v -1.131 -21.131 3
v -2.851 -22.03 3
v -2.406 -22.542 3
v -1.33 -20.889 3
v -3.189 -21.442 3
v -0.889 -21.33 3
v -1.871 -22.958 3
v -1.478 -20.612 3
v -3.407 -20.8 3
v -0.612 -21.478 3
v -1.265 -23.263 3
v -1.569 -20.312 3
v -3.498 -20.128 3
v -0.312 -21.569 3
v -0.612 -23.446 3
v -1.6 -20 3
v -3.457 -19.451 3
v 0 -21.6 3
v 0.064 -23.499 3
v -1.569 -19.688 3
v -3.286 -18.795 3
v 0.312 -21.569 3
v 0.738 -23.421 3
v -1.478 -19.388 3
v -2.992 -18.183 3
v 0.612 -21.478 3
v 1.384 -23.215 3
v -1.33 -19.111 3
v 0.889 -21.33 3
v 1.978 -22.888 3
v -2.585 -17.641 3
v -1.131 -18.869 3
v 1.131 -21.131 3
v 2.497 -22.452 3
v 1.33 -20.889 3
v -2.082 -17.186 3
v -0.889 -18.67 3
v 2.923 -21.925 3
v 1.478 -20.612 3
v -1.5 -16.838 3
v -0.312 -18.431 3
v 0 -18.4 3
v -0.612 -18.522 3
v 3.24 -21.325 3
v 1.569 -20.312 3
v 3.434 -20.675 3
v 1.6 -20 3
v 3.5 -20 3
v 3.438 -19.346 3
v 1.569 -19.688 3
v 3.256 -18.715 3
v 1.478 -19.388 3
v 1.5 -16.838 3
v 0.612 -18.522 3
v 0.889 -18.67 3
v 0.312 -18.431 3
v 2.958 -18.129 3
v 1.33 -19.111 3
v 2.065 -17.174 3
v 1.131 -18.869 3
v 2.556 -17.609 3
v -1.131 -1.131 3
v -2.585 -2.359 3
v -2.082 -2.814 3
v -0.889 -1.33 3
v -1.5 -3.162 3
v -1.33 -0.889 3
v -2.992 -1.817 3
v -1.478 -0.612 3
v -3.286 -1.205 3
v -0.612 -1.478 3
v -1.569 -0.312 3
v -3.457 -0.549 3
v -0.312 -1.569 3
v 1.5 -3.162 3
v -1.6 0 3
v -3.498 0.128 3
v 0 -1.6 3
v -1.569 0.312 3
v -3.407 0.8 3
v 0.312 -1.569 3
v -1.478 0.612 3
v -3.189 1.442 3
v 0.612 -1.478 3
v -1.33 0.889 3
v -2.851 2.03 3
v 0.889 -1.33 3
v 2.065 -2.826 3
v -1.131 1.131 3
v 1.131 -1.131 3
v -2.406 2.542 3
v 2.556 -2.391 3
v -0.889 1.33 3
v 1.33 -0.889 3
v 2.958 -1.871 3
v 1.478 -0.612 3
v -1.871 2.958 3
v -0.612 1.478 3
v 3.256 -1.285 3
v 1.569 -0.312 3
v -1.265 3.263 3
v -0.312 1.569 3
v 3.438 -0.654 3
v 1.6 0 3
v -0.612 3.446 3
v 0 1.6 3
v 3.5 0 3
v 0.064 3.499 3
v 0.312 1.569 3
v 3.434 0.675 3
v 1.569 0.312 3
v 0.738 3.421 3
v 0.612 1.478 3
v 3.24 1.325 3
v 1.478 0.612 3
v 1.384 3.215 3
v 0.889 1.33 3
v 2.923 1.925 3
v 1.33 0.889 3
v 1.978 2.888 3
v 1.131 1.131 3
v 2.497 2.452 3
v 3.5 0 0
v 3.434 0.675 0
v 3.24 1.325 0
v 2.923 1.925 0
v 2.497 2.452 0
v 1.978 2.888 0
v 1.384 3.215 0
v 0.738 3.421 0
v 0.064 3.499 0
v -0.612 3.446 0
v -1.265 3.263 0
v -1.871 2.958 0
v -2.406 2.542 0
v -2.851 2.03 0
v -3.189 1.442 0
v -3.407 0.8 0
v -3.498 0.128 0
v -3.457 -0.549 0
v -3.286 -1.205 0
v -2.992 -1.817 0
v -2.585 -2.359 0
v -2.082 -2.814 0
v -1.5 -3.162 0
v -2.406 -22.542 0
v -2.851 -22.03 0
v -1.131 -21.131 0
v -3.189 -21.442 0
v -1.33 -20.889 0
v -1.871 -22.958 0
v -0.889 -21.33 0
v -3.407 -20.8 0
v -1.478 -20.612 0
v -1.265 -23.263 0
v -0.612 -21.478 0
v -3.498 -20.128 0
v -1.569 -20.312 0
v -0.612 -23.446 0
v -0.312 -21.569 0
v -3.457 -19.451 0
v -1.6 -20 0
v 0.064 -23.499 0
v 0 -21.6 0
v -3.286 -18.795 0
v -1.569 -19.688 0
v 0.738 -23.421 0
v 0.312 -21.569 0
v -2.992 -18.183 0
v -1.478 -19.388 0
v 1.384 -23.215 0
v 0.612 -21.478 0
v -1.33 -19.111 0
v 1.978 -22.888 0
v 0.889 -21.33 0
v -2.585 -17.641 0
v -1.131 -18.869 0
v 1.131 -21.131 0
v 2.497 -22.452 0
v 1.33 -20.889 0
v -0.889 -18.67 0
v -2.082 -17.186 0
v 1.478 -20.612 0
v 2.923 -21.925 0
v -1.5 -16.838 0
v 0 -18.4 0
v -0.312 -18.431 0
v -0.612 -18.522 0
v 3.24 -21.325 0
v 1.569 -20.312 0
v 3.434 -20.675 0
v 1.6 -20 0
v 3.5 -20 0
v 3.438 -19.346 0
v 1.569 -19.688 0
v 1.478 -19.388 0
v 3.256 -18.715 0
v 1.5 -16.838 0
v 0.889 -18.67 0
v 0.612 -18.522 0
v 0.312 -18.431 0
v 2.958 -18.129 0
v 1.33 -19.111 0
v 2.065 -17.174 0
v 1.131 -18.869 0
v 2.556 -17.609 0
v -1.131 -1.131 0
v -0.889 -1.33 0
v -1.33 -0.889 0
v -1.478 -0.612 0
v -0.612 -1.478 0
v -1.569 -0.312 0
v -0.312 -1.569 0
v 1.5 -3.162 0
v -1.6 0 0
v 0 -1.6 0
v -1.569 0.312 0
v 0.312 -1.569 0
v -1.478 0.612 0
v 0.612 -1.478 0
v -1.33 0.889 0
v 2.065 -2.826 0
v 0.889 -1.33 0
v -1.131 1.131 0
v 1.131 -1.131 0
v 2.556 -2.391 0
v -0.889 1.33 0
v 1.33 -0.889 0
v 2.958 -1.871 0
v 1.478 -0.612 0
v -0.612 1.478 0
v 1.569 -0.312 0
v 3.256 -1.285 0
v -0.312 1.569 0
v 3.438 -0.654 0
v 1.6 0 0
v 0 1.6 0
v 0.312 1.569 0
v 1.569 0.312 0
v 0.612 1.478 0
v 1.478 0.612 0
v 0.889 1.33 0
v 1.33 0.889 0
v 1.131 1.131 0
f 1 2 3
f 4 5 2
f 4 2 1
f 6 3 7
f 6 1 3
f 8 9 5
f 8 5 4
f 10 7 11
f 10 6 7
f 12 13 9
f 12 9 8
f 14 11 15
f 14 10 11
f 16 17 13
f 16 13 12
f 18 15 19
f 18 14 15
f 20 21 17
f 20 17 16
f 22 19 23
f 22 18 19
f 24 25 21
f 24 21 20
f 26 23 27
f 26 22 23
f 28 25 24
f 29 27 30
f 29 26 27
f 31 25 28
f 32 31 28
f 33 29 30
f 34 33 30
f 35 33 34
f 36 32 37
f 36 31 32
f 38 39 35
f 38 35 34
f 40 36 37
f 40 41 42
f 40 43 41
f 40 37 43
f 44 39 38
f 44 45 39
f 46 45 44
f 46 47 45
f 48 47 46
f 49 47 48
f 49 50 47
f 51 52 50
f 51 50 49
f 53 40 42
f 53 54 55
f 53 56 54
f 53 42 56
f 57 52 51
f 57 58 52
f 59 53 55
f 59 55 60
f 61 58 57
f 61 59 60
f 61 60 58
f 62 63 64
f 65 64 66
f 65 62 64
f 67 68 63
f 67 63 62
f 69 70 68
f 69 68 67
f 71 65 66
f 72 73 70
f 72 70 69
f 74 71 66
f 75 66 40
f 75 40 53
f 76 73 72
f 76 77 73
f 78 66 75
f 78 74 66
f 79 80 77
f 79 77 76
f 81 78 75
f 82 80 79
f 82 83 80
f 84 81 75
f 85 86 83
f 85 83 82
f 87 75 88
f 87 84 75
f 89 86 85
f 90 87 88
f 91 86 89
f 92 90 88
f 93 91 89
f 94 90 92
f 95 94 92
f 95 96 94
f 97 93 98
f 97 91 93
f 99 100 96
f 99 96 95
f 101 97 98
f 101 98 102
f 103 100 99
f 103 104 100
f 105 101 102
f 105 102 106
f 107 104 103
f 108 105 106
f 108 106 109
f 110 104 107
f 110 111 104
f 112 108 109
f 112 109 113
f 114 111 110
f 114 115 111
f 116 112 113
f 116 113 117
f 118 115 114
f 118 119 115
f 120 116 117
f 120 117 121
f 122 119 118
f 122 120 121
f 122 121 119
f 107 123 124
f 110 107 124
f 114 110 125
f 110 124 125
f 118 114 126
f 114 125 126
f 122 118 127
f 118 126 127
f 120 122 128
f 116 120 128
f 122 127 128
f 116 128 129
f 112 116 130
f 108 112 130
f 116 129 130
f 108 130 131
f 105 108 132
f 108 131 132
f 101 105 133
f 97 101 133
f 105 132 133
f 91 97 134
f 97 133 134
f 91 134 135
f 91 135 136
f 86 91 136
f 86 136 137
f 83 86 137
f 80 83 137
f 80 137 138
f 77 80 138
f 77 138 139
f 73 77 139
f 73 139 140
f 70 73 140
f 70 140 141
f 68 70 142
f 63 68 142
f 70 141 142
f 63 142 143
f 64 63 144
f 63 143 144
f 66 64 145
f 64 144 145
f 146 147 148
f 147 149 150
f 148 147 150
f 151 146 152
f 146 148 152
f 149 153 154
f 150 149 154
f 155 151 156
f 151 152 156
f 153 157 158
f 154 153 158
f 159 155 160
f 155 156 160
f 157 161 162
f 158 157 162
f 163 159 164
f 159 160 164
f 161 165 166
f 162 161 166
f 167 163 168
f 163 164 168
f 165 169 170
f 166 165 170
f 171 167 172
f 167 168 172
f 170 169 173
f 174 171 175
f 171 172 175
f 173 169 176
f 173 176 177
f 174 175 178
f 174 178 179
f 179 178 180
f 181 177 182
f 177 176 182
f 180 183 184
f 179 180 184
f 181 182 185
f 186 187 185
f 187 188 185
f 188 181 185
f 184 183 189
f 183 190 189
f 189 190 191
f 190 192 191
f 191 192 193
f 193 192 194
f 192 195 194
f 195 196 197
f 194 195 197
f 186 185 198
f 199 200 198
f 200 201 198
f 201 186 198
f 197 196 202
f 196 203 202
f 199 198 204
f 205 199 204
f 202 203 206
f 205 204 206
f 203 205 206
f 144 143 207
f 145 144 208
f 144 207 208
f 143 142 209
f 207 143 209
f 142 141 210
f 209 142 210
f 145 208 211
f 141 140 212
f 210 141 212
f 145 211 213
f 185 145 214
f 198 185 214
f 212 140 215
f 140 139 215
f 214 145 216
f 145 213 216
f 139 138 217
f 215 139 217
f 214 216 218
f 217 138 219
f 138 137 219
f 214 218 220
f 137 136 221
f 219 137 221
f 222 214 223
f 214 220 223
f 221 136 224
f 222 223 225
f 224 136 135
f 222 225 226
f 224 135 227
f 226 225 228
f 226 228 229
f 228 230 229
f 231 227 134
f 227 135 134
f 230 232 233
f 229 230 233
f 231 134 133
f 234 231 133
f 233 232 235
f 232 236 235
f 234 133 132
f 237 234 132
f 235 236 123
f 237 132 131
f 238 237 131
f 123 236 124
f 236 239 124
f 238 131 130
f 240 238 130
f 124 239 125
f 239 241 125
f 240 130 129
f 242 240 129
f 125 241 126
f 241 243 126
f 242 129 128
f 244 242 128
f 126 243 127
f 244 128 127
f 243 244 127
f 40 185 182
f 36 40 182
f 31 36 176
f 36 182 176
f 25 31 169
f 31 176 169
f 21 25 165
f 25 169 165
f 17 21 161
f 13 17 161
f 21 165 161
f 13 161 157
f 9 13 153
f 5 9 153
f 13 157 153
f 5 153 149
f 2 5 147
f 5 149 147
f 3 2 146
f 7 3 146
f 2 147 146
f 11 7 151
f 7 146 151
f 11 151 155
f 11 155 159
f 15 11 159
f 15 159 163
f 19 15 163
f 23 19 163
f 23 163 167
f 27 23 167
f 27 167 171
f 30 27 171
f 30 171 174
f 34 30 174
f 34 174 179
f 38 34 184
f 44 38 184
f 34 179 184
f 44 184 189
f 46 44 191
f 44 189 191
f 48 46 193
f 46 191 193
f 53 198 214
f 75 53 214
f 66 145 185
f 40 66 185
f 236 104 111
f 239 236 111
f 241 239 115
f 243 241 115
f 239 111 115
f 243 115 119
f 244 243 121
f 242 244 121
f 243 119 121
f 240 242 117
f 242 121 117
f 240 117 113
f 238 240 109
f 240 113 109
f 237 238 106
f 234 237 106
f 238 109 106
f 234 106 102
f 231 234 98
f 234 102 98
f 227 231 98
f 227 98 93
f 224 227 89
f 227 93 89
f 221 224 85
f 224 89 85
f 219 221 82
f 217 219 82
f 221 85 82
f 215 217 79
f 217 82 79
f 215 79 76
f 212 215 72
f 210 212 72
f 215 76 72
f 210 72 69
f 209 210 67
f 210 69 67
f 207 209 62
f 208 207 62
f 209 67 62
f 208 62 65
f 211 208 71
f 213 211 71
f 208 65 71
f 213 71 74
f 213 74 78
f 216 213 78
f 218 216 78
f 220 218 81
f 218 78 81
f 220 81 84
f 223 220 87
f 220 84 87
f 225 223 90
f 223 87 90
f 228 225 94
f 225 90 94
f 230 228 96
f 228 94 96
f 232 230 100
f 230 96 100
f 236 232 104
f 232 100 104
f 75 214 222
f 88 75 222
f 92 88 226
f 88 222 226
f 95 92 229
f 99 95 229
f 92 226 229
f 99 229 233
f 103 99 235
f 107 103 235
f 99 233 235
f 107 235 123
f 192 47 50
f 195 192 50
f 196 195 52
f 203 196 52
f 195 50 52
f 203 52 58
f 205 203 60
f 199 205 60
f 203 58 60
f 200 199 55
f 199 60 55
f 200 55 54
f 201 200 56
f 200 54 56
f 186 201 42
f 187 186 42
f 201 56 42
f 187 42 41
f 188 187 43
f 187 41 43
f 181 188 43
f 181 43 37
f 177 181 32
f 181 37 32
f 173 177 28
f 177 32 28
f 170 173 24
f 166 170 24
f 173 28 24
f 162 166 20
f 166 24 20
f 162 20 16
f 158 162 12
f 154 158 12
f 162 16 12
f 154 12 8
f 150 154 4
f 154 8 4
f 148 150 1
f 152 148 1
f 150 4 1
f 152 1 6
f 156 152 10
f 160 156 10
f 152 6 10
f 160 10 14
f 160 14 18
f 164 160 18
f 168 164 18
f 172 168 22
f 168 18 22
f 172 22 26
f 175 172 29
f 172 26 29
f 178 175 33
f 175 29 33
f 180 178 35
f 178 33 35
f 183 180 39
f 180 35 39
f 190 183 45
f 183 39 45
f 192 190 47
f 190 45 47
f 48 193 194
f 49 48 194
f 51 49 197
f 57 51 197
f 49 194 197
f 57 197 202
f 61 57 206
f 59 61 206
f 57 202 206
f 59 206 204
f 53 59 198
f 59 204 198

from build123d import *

# Parameters (mm, degrees)
BOSS_EXTRUDE1_DEPTH = 3
SKETCH2_R           = 1.6
CUT_EXTRUDE1_DEPTH  = 3


with BuildPart() as part:
    # Sketch1 → Boss-Extrude1 (new body)
    with BuildSketch(Plane.XY):
        with BuildLine():
            Line((-1.5, -3.16227766), (-1.5, 0))
            Line((-1.5, 0), (1.5, 0))
            Line((1.5, 0), (1.5, -3.16227766))
            ThreePointArc((1.5, -3.16227766), (2.958039892, -1.870828693), (3.5, 0))
            ThreePointArc((3.5, 0), (-1.870828693, 2.958039892), (-1.5, -3.16227766))
        make_face()
        with BuildLine():
            Line((1.5, 0), (-1.5, 0))
            Line((-1.5, 0), (-1.5, -3.16227766))
            ThreePointArc((-1.5, -3.16227766), (0, -3.5), (1.5, -3.16227766))
            Line((1.5, -3.16227766), (1.5, 0))
        make_face()
        with BuildLine():
            ThreePointArc((1.5, -3.16227766), (0, -3.5), (-1.5, -3.16227766))
            Line((-1.5, -3.16227766), (-1.5, -16.83772234))
            ThreePointArc((-1.5, -16.83772234), (0, -16.5), (1.5, -16.83772234))
            Line((1.5, -16.83772234), (1.5, -3.16227766))
        make_face()
        with BuildLine():
            ThreePointArc((1.5, -16.83772234), (0, -16.5), (-1.5, -16.83772234))
            Line((-1.5, -16.83772234), (-1.5, -20))
            Line((-1.5, -20), (1.5, -20))
            Line((1.5, -20), (1.5, -16.83772234))
        make_face()
        with BuildLine():
            Line((-1.5, -20), (-1.5, -16.83772234))
            ThreePointArc((-1.5, -16.83772234), (-1.870828693, -22.958039892), (3.5, -20))
            ThreePointArc((3.5, -20), (2.958039892, -18.129171307), (1.5, -16.83772234))
            Line((1.5, -16.83772234), (1.5, -20))
            Line((1.5, -20), (-1.5, -20))
        make_face()
    extrude(amount=BOSS_EXTRUDE1_DEPTH)

    # Sketch2 → Cut-Extrude1 (cut)
    with BuildSketch(Plane.XY.offset(3)):
        with Locations((0, -20)):
            Circle(SKETCH2_R)
        Circle(SKETCH2_R)
    extrude(amount=-CUT_EXTRUDE1_DEPTH, mode=Mode.SUBTRACT)


solid = part.part
